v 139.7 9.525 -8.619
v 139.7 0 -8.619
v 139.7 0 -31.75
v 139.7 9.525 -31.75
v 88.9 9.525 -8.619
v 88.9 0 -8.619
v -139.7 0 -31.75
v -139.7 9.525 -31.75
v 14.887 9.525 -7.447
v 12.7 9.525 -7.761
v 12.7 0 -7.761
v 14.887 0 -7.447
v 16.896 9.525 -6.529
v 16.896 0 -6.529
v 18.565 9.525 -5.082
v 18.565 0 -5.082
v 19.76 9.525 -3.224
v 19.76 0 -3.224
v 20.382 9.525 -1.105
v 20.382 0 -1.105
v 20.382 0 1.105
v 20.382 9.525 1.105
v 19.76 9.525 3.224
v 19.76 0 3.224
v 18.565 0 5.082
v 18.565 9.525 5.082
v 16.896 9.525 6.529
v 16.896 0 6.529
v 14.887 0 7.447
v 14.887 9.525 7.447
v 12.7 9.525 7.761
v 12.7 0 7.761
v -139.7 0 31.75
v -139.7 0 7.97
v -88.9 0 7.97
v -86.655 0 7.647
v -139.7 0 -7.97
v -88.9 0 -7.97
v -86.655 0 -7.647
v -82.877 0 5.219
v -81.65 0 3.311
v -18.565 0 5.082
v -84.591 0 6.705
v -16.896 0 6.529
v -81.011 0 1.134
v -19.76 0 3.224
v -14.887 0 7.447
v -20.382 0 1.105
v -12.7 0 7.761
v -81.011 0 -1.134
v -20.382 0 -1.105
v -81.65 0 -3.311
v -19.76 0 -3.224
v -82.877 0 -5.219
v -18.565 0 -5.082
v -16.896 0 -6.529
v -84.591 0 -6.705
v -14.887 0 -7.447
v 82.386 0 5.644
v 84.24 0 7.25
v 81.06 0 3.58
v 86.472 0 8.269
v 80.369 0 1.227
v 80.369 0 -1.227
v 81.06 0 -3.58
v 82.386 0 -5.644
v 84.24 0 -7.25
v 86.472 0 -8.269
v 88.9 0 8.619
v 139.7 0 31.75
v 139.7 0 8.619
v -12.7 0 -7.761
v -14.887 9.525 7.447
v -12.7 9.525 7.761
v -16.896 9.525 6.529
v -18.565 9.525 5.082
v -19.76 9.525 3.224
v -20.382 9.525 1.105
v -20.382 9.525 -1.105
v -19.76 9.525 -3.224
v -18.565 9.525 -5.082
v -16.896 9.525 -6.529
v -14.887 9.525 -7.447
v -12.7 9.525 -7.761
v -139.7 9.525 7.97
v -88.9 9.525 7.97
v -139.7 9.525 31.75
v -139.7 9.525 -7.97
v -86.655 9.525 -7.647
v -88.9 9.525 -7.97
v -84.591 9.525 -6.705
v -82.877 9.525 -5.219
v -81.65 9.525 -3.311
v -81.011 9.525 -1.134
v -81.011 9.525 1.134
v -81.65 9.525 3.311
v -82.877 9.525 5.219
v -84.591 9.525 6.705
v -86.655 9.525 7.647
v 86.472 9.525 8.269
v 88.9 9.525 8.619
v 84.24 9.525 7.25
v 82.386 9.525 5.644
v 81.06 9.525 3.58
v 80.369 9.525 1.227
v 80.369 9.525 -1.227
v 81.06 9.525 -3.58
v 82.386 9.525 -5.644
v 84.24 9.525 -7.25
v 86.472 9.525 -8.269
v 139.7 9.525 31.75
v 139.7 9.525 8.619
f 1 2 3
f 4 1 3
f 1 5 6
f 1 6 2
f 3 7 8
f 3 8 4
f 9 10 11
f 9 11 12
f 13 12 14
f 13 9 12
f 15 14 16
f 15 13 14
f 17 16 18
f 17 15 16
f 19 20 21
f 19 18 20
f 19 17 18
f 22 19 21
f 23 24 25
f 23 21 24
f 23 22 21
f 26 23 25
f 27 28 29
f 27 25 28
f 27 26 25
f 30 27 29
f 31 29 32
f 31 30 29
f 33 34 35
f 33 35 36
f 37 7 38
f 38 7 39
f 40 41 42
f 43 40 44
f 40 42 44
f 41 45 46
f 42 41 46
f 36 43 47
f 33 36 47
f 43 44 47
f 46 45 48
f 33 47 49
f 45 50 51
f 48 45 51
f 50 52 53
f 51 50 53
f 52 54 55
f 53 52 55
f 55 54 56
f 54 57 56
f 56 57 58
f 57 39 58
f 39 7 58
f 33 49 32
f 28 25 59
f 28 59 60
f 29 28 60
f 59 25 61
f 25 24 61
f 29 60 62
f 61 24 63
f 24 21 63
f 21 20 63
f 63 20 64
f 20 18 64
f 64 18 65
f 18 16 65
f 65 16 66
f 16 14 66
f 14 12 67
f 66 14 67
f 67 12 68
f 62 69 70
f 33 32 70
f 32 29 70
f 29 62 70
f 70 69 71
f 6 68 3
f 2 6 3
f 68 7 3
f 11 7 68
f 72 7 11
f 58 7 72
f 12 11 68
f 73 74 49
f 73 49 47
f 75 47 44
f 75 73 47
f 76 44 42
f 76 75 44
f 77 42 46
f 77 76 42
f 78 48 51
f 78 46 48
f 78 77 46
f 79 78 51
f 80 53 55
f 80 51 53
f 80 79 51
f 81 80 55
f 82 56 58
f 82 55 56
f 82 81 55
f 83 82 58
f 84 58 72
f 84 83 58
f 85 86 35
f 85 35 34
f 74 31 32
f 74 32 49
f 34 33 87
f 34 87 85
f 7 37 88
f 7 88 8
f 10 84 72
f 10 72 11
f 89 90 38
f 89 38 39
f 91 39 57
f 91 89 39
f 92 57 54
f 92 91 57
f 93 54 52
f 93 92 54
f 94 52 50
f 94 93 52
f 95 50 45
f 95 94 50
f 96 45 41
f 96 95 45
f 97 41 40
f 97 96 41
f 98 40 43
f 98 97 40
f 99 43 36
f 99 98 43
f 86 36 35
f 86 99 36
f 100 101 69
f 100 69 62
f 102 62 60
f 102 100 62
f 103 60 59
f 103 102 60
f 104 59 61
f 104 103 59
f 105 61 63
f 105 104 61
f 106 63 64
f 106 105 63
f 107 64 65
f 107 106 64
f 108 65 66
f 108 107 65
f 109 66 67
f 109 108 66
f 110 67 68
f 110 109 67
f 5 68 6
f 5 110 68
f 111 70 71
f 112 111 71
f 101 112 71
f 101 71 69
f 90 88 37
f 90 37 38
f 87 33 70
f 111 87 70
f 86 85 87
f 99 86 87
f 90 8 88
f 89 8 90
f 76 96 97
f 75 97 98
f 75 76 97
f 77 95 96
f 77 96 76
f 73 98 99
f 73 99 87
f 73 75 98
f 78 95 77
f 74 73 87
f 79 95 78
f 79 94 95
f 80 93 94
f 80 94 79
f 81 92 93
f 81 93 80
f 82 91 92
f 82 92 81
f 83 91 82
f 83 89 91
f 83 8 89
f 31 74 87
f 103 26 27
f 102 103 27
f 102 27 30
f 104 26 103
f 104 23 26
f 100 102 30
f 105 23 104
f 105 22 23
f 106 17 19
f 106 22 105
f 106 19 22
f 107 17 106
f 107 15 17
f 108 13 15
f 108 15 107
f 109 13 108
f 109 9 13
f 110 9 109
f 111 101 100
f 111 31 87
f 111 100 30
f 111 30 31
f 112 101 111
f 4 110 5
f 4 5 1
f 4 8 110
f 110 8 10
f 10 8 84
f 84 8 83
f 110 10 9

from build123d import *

# Parameters (mm, degrees)
SKETCH1_W           = 279.4
SKETCH1_H           = 63.5
BOSS_EXTRUDE1_DEPTH = 9.525
CUT_EXTRUDE5_DEPTH  = 10.525
CUT_EXTRUDE7_DEPTH  = 10.525
CUT_EXTRUDE8_DEPTH  = 10.525


with BuildPart() as part:
    # Sketch1 → Boss-Extrude1 (new body)
    with BuildSketch(Plane(origin=(0, 0, 0), x_dir=(1, 0, 0), z_dir=(0, 1, 0))):
        Rectangle(SKETCH1_W, SKETCH1_H)
    extrude(amount=BOSS_EXTRUDE1_DEPTH)

    # Sketch9 → Cut-Extrude5 (cut, through all)
    with BuildSketch(Plane(origin=(0, 9.525, 0), x_dir=(1, 0, 0), z_dir=(0, 1, 0))):
        with BuildLine():
            Line((-139.7, 7.969965865), (-88.9, 7.969965865))
            ThreePointArc((-88.9, 7.969965865), (-80.930034135, 0), (-88.9, -7.969965865))
            Line((-88.9, -7.969965865), (-139.7, -7.969965865))
            Line((-139.7, -7.969965865), (-139.7, 7.969965865))
        make_face()
    extrude(amount=-CUT_EXTRUDE5_DEPTH, mode=Mode.SUBTRACT)

    # Sketch12 → Cut-Extrude7 (cut, through all)
    with BuildSketch(Plane(origin=(0, 9.525, 0), x_dir=(1, 0, 0), z_dir=(0, 1, 0))):
        with BuildLine():
            Line((139.7, -8.618596636), (88.9, -8.618596636))
            ThreePointArc((88.9, -8.618596636), (80.281403364, 0), (88.9, 8.618596636))
            Line((88.9, 8.618596636), (139.7, 8.618596636))
            Line((139.7, 8.618596636), (139.7, -8.618596636))
        make_face()
    extrude(amount=-CUT_EXTRUDE7_DEPTH, mode=Mode.SUBTRACT)

    # Sketch13 → Cut-Extrude8 (cut, through all)
    with BuildSketch(Plane(origin=(0, 9.525, 0), x_dir=(1, 0, 0), z_dir=(0, 1, 0))):
        with BuildLine():
            Line((-12.7, 7.761111111), (12.7, 7.761111111))
            ThreePointArc((12.7, 7.761111111), (20.461111111, 0), (12.7, -7.761111111))
            Line((12.7, -7.761111111), (-12.7, -7.761111111))
            ThreePointArc((-12.7, -7.761111111), (-20.461111111, 0), (-12.7, 7.761111111))
        make_face()
    extrude(amount=-CUT_EXTRUDE8_DEPTH, mode=Mode.SUBTRACT)


solid = part.part
